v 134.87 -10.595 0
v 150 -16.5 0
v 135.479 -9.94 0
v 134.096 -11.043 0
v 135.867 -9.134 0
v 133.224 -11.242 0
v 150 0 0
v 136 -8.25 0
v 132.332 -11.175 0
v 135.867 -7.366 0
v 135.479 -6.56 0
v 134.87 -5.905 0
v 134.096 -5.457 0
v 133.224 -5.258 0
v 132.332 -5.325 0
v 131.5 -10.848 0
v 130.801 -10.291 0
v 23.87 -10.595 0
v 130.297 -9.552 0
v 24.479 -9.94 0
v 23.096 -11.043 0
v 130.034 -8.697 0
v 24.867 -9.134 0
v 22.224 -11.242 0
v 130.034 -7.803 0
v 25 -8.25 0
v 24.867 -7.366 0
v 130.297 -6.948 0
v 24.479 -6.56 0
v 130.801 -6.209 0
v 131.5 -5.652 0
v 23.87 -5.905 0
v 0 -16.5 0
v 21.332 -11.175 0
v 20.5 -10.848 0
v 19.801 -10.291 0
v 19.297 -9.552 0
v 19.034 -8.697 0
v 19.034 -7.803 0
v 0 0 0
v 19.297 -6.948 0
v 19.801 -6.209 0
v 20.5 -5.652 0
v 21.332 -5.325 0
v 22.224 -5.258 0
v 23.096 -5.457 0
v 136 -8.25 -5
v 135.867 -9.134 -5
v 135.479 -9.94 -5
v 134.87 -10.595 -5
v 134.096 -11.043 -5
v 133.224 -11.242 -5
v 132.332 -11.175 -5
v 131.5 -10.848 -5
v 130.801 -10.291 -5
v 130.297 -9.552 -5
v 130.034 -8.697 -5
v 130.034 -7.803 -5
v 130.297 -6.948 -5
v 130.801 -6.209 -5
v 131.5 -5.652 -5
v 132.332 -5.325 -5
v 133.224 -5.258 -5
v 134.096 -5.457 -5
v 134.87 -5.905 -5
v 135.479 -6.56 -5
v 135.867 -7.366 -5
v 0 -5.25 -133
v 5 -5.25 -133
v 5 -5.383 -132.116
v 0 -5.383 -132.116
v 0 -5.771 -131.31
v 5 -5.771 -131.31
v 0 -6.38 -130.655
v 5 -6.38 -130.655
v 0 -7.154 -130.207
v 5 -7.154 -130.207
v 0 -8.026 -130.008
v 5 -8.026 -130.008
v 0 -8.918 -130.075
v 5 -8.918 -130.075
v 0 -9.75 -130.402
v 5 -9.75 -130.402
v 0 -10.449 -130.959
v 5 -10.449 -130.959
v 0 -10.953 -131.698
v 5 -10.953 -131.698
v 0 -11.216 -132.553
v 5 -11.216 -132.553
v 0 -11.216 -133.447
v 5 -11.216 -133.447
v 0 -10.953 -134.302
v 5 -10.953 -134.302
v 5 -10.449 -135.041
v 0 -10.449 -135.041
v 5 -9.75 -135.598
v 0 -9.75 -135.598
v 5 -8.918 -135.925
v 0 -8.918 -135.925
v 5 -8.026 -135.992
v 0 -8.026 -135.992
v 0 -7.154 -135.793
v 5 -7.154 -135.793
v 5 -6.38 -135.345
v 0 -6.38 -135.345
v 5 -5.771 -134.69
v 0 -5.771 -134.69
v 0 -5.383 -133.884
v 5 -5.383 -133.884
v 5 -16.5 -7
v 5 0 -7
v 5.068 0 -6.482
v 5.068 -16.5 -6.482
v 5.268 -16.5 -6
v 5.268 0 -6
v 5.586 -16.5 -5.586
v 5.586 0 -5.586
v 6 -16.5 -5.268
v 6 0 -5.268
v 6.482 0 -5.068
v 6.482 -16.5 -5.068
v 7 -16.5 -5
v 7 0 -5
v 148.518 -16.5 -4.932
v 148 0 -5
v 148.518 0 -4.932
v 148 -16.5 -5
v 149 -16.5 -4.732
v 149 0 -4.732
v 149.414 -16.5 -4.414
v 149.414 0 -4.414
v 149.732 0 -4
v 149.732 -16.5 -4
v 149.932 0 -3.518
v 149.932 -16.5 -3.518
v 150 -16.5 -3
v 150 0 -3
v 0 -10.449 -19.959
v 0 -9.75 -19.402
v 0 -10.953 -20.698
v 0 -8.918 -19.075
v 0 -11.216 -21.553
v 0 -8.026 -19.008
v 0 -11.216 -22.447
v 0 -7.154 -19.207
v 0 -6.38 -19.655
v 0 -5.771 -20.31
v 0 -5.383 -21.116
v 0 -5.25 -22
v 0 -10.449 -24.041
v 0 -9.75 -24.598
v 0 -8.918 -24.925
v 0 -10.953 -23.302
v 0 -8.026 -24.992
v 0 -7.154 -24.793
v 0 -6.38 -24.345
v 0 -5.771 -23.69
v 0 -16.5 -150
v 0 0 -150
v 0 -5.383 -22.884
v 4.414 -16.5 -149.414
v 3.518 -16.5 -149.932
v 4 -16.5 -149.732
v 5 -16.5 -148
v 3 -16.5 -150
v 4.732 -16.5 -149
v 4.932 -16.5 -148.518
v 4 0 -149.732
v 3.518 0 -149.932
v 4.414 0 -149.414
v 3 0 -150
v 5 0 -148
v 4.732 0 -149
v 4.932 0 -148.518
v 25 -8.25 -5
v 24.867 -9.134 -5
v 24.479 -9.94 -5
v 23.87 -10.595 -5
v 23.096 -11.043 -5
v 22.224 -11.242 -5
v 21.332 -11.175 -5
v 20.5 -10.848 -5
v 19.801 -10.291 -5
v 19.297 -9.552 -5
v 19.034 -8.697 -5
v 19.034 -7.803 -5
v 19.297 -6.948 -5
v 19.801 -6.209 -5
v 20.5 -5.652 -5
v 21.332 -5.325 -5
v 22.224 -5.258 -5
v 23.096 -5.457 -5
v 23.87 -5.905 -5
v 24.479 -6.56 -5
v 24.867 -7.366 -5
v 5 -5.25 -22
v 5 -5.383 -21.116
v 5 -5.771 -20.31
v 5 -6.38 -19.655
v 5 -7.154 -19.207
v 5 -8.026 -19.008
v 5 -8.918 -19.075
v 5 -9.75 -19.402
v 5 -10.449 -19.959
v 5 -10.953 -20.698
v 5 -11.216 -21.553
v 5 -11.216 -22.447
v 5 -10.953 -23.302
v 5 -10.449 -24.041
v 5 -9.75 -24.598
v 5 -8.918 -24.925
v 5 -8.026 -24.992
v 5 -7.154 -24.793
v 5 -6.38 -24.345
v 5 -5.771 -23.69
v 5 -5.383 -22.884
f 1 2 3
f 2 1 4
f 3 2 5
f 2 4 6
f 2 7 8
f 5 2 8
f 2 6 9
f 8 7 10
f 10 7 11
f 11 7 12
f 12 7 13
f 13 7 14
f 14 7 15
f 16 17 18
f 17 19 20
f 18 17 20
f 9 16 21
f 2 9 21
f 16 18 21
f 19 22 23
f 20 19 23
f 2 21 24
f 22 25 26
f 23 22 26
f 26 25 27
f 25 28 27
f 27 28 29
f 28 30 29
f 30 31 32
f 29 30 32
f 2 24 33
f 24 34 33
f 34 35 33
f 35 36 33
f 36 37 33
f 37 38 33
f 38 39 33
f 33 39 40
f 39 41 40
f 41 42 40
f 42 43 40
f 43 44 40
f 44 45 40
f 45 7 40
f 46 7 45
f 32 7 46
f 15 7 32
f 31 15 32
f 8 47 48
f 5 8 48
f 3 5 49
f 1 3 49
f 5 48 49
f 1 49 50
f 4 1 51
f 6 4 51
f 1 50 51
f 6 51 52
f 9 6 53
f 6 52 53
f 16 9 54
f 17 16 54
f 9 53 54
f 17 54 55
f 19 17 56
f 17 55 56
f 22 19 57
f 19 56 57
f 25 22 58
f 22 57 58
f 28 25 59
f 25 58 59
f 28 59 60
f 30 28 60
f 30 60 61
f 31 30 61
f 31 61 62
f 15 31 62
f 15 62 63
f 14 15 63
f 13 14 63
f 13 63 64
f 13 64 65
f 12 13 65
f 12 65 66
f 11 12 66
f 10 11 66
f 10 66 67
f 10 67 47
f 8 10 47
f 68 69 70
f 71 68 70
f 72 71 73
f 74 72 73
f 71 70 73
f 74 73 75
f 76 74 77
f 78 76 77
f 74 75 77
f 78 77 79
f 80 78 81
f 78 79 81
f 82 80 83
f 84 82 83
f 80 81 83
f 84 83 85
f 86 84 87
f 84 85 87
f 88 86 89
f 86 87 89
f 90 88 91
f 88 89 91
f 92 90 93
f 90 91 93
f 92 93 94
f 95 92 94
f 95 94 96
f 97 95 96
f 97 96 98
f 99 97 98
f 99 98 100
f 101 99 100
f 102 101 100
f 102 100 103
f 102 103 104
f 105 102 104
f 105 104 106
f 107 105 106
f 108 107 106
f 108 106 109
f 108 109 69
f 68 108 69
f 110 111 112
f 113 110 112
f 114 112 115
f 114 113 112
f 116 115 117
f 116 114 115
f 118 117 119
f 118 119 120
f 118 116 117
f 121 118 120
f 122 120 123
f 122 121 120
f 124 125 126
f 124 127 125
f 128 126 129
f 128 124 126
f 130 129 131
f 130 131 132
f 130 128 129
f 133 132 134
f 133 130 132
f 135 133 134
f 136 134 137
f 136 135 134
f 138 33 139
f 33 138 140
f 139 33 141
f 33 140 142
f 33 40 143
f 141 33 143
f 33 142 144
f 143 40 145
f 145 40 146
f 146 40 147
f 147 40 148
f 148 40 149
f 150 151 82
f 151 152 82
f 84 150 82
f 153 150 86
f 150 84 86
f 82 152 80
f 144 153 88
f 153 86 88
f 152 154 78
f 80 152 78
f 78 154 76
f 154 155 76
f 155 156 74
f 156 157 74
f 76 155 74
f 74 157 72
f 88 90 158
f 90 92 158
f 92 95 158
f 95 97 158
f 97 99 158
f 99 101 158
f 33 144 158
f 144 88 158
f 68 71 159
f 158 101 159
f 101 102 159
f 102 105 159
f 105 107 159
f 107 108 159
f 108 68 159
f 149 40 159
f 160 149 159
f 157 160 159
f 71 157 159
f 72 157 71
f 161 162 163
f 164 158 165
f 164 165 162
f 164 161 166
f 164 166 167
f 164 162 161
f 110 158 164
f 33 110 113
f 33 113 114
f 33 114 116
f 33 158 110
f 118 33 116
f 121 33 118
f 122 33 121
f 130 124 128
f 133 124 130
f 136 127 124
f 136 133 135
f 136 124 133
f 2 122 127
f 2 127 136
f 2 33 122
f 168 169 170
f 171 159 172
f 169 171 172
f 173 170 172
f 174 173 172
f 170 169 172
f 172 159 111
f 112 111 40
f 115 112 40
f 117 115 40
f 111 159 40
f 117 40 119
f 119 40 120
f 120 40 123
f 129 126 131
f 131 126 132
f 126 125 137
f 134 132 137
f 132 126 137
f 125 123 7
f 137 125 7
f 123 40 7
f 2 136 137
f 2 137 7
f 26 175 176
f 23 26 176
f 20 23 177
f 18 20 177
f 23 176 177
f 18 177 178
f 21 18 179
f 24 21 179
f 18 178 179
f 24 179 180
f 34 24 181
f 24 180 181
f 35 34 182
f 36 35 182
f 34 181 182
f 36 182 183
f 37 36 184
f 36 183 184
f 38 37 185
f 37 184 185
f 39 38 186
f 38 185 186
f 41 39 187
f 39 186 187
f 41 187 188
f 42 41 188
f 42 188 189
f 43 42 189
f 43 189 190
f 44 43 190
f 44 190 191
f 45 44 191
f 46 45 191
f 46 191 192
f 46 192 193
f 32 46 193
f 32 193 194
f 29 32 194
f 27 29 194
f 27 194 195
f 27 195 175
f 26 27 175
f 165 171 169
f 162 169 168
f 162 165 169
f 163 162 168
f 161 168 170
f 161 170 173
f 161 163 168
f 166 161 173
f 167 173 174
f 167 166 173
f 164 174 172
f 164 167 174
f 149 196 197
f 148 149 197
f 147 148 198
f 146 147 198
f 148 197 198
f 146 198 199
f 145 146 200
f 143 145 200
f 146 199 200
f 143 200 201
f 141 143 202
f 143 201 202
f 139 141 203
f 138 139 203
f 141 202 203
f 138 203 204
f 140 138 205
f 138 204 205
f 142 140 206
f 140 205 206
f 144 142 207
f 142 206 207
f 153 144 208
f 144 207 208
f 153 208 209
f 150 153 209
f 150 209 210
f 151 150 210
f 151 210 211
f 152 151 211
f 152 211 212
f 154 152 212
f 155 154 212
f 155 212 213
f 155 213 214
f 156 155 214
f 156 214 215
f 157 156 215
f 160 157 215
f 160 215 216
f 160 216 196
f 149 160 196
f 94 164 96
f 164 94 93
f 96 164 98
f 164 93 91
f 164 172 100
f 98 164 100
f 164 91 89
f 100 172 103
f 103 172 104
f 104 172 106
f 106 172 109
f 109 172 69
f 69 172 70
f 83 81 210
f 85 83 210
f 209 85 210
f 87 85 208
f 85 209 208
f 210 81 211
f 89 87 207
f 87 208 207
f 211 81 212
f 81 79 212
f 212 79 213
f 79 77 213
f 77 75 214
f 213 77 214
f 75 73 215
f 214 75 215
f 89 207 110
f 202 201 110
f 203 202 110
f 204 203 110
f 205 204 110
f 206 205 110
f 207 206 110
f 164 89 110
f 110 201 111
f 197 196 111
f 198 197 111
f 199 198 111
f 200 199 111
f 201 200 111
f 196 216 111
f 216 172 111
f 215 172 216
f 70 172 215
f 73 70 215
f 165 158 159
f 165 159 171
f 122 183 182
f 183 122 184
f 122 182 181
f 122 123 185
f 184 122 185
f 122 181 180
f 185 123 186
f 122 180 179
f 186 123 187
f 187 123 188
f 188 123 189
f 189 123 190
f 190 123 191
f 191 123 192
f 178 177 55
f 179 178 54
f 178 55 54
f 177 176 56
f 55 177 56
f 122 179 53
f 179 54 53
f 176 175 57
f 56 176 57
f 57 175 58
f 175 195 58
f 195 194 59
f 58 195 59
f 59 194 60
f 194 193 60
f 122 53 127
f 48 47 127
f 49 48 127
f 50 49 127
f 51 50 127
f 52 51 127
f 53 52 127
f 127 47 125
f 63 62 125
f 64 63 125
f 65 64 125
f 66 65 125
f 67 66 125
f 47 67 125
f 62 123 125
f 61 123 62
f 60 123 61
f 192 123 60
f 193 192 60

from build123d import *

# Parameters (mm, degrees)
F1_DEPTH = 16.5
F2_R     = 2
F3_R     = 3
F4_DEPTH = 25
F5_R     = 3
F6_DEPTH = 25


with BuildPart() as f1:
    # F0 (on Front) → F1 (new body)
    with BuildSketch(Plane.XZ):
        Polygon((5, 0), (0, 0), (0, -5), (0, -150), (5, -150), (5, -5), (150, -5), (150, 0), align=None)
    extrude(amount=F1_DEPTH)

    # F2
    f2_edges = [f1.edges().sort_by_distance(p)[0] for p in [
        (5, -8.25, -5),
        (150, -8.25, -5),
        (5, -8.25, -150),
    ]]
    fillet(f2_edges, radius=F2_R)

    # F3 (on face) → F4 (cut)
    with BuildSketch(Plane(origin=(0, 0, -5), x_dir=(1, 0, 0), z_dir=(0, 0, -1))):
        with Locations((133, 8.25)):
            Circle(F3_R)
        with Locations((22, 8.25)):
            Circle(F3_R)
    extrude(amount=-F4_DEPTH, mode=Mode.SUBTRACT)

    # F5 (on face) → F6 (cut)
    with BuildSketch(Plane.YZ.offset(5)):
        with Locations((-8.25, -133)):
            Circle(F5_R)
        with Locations((-8.25, -22)):
            Circle(F5_R)
    extrude(amount=-F6_DEPTH, mode=Mode.SUBTRACT)


solid = f1.part
